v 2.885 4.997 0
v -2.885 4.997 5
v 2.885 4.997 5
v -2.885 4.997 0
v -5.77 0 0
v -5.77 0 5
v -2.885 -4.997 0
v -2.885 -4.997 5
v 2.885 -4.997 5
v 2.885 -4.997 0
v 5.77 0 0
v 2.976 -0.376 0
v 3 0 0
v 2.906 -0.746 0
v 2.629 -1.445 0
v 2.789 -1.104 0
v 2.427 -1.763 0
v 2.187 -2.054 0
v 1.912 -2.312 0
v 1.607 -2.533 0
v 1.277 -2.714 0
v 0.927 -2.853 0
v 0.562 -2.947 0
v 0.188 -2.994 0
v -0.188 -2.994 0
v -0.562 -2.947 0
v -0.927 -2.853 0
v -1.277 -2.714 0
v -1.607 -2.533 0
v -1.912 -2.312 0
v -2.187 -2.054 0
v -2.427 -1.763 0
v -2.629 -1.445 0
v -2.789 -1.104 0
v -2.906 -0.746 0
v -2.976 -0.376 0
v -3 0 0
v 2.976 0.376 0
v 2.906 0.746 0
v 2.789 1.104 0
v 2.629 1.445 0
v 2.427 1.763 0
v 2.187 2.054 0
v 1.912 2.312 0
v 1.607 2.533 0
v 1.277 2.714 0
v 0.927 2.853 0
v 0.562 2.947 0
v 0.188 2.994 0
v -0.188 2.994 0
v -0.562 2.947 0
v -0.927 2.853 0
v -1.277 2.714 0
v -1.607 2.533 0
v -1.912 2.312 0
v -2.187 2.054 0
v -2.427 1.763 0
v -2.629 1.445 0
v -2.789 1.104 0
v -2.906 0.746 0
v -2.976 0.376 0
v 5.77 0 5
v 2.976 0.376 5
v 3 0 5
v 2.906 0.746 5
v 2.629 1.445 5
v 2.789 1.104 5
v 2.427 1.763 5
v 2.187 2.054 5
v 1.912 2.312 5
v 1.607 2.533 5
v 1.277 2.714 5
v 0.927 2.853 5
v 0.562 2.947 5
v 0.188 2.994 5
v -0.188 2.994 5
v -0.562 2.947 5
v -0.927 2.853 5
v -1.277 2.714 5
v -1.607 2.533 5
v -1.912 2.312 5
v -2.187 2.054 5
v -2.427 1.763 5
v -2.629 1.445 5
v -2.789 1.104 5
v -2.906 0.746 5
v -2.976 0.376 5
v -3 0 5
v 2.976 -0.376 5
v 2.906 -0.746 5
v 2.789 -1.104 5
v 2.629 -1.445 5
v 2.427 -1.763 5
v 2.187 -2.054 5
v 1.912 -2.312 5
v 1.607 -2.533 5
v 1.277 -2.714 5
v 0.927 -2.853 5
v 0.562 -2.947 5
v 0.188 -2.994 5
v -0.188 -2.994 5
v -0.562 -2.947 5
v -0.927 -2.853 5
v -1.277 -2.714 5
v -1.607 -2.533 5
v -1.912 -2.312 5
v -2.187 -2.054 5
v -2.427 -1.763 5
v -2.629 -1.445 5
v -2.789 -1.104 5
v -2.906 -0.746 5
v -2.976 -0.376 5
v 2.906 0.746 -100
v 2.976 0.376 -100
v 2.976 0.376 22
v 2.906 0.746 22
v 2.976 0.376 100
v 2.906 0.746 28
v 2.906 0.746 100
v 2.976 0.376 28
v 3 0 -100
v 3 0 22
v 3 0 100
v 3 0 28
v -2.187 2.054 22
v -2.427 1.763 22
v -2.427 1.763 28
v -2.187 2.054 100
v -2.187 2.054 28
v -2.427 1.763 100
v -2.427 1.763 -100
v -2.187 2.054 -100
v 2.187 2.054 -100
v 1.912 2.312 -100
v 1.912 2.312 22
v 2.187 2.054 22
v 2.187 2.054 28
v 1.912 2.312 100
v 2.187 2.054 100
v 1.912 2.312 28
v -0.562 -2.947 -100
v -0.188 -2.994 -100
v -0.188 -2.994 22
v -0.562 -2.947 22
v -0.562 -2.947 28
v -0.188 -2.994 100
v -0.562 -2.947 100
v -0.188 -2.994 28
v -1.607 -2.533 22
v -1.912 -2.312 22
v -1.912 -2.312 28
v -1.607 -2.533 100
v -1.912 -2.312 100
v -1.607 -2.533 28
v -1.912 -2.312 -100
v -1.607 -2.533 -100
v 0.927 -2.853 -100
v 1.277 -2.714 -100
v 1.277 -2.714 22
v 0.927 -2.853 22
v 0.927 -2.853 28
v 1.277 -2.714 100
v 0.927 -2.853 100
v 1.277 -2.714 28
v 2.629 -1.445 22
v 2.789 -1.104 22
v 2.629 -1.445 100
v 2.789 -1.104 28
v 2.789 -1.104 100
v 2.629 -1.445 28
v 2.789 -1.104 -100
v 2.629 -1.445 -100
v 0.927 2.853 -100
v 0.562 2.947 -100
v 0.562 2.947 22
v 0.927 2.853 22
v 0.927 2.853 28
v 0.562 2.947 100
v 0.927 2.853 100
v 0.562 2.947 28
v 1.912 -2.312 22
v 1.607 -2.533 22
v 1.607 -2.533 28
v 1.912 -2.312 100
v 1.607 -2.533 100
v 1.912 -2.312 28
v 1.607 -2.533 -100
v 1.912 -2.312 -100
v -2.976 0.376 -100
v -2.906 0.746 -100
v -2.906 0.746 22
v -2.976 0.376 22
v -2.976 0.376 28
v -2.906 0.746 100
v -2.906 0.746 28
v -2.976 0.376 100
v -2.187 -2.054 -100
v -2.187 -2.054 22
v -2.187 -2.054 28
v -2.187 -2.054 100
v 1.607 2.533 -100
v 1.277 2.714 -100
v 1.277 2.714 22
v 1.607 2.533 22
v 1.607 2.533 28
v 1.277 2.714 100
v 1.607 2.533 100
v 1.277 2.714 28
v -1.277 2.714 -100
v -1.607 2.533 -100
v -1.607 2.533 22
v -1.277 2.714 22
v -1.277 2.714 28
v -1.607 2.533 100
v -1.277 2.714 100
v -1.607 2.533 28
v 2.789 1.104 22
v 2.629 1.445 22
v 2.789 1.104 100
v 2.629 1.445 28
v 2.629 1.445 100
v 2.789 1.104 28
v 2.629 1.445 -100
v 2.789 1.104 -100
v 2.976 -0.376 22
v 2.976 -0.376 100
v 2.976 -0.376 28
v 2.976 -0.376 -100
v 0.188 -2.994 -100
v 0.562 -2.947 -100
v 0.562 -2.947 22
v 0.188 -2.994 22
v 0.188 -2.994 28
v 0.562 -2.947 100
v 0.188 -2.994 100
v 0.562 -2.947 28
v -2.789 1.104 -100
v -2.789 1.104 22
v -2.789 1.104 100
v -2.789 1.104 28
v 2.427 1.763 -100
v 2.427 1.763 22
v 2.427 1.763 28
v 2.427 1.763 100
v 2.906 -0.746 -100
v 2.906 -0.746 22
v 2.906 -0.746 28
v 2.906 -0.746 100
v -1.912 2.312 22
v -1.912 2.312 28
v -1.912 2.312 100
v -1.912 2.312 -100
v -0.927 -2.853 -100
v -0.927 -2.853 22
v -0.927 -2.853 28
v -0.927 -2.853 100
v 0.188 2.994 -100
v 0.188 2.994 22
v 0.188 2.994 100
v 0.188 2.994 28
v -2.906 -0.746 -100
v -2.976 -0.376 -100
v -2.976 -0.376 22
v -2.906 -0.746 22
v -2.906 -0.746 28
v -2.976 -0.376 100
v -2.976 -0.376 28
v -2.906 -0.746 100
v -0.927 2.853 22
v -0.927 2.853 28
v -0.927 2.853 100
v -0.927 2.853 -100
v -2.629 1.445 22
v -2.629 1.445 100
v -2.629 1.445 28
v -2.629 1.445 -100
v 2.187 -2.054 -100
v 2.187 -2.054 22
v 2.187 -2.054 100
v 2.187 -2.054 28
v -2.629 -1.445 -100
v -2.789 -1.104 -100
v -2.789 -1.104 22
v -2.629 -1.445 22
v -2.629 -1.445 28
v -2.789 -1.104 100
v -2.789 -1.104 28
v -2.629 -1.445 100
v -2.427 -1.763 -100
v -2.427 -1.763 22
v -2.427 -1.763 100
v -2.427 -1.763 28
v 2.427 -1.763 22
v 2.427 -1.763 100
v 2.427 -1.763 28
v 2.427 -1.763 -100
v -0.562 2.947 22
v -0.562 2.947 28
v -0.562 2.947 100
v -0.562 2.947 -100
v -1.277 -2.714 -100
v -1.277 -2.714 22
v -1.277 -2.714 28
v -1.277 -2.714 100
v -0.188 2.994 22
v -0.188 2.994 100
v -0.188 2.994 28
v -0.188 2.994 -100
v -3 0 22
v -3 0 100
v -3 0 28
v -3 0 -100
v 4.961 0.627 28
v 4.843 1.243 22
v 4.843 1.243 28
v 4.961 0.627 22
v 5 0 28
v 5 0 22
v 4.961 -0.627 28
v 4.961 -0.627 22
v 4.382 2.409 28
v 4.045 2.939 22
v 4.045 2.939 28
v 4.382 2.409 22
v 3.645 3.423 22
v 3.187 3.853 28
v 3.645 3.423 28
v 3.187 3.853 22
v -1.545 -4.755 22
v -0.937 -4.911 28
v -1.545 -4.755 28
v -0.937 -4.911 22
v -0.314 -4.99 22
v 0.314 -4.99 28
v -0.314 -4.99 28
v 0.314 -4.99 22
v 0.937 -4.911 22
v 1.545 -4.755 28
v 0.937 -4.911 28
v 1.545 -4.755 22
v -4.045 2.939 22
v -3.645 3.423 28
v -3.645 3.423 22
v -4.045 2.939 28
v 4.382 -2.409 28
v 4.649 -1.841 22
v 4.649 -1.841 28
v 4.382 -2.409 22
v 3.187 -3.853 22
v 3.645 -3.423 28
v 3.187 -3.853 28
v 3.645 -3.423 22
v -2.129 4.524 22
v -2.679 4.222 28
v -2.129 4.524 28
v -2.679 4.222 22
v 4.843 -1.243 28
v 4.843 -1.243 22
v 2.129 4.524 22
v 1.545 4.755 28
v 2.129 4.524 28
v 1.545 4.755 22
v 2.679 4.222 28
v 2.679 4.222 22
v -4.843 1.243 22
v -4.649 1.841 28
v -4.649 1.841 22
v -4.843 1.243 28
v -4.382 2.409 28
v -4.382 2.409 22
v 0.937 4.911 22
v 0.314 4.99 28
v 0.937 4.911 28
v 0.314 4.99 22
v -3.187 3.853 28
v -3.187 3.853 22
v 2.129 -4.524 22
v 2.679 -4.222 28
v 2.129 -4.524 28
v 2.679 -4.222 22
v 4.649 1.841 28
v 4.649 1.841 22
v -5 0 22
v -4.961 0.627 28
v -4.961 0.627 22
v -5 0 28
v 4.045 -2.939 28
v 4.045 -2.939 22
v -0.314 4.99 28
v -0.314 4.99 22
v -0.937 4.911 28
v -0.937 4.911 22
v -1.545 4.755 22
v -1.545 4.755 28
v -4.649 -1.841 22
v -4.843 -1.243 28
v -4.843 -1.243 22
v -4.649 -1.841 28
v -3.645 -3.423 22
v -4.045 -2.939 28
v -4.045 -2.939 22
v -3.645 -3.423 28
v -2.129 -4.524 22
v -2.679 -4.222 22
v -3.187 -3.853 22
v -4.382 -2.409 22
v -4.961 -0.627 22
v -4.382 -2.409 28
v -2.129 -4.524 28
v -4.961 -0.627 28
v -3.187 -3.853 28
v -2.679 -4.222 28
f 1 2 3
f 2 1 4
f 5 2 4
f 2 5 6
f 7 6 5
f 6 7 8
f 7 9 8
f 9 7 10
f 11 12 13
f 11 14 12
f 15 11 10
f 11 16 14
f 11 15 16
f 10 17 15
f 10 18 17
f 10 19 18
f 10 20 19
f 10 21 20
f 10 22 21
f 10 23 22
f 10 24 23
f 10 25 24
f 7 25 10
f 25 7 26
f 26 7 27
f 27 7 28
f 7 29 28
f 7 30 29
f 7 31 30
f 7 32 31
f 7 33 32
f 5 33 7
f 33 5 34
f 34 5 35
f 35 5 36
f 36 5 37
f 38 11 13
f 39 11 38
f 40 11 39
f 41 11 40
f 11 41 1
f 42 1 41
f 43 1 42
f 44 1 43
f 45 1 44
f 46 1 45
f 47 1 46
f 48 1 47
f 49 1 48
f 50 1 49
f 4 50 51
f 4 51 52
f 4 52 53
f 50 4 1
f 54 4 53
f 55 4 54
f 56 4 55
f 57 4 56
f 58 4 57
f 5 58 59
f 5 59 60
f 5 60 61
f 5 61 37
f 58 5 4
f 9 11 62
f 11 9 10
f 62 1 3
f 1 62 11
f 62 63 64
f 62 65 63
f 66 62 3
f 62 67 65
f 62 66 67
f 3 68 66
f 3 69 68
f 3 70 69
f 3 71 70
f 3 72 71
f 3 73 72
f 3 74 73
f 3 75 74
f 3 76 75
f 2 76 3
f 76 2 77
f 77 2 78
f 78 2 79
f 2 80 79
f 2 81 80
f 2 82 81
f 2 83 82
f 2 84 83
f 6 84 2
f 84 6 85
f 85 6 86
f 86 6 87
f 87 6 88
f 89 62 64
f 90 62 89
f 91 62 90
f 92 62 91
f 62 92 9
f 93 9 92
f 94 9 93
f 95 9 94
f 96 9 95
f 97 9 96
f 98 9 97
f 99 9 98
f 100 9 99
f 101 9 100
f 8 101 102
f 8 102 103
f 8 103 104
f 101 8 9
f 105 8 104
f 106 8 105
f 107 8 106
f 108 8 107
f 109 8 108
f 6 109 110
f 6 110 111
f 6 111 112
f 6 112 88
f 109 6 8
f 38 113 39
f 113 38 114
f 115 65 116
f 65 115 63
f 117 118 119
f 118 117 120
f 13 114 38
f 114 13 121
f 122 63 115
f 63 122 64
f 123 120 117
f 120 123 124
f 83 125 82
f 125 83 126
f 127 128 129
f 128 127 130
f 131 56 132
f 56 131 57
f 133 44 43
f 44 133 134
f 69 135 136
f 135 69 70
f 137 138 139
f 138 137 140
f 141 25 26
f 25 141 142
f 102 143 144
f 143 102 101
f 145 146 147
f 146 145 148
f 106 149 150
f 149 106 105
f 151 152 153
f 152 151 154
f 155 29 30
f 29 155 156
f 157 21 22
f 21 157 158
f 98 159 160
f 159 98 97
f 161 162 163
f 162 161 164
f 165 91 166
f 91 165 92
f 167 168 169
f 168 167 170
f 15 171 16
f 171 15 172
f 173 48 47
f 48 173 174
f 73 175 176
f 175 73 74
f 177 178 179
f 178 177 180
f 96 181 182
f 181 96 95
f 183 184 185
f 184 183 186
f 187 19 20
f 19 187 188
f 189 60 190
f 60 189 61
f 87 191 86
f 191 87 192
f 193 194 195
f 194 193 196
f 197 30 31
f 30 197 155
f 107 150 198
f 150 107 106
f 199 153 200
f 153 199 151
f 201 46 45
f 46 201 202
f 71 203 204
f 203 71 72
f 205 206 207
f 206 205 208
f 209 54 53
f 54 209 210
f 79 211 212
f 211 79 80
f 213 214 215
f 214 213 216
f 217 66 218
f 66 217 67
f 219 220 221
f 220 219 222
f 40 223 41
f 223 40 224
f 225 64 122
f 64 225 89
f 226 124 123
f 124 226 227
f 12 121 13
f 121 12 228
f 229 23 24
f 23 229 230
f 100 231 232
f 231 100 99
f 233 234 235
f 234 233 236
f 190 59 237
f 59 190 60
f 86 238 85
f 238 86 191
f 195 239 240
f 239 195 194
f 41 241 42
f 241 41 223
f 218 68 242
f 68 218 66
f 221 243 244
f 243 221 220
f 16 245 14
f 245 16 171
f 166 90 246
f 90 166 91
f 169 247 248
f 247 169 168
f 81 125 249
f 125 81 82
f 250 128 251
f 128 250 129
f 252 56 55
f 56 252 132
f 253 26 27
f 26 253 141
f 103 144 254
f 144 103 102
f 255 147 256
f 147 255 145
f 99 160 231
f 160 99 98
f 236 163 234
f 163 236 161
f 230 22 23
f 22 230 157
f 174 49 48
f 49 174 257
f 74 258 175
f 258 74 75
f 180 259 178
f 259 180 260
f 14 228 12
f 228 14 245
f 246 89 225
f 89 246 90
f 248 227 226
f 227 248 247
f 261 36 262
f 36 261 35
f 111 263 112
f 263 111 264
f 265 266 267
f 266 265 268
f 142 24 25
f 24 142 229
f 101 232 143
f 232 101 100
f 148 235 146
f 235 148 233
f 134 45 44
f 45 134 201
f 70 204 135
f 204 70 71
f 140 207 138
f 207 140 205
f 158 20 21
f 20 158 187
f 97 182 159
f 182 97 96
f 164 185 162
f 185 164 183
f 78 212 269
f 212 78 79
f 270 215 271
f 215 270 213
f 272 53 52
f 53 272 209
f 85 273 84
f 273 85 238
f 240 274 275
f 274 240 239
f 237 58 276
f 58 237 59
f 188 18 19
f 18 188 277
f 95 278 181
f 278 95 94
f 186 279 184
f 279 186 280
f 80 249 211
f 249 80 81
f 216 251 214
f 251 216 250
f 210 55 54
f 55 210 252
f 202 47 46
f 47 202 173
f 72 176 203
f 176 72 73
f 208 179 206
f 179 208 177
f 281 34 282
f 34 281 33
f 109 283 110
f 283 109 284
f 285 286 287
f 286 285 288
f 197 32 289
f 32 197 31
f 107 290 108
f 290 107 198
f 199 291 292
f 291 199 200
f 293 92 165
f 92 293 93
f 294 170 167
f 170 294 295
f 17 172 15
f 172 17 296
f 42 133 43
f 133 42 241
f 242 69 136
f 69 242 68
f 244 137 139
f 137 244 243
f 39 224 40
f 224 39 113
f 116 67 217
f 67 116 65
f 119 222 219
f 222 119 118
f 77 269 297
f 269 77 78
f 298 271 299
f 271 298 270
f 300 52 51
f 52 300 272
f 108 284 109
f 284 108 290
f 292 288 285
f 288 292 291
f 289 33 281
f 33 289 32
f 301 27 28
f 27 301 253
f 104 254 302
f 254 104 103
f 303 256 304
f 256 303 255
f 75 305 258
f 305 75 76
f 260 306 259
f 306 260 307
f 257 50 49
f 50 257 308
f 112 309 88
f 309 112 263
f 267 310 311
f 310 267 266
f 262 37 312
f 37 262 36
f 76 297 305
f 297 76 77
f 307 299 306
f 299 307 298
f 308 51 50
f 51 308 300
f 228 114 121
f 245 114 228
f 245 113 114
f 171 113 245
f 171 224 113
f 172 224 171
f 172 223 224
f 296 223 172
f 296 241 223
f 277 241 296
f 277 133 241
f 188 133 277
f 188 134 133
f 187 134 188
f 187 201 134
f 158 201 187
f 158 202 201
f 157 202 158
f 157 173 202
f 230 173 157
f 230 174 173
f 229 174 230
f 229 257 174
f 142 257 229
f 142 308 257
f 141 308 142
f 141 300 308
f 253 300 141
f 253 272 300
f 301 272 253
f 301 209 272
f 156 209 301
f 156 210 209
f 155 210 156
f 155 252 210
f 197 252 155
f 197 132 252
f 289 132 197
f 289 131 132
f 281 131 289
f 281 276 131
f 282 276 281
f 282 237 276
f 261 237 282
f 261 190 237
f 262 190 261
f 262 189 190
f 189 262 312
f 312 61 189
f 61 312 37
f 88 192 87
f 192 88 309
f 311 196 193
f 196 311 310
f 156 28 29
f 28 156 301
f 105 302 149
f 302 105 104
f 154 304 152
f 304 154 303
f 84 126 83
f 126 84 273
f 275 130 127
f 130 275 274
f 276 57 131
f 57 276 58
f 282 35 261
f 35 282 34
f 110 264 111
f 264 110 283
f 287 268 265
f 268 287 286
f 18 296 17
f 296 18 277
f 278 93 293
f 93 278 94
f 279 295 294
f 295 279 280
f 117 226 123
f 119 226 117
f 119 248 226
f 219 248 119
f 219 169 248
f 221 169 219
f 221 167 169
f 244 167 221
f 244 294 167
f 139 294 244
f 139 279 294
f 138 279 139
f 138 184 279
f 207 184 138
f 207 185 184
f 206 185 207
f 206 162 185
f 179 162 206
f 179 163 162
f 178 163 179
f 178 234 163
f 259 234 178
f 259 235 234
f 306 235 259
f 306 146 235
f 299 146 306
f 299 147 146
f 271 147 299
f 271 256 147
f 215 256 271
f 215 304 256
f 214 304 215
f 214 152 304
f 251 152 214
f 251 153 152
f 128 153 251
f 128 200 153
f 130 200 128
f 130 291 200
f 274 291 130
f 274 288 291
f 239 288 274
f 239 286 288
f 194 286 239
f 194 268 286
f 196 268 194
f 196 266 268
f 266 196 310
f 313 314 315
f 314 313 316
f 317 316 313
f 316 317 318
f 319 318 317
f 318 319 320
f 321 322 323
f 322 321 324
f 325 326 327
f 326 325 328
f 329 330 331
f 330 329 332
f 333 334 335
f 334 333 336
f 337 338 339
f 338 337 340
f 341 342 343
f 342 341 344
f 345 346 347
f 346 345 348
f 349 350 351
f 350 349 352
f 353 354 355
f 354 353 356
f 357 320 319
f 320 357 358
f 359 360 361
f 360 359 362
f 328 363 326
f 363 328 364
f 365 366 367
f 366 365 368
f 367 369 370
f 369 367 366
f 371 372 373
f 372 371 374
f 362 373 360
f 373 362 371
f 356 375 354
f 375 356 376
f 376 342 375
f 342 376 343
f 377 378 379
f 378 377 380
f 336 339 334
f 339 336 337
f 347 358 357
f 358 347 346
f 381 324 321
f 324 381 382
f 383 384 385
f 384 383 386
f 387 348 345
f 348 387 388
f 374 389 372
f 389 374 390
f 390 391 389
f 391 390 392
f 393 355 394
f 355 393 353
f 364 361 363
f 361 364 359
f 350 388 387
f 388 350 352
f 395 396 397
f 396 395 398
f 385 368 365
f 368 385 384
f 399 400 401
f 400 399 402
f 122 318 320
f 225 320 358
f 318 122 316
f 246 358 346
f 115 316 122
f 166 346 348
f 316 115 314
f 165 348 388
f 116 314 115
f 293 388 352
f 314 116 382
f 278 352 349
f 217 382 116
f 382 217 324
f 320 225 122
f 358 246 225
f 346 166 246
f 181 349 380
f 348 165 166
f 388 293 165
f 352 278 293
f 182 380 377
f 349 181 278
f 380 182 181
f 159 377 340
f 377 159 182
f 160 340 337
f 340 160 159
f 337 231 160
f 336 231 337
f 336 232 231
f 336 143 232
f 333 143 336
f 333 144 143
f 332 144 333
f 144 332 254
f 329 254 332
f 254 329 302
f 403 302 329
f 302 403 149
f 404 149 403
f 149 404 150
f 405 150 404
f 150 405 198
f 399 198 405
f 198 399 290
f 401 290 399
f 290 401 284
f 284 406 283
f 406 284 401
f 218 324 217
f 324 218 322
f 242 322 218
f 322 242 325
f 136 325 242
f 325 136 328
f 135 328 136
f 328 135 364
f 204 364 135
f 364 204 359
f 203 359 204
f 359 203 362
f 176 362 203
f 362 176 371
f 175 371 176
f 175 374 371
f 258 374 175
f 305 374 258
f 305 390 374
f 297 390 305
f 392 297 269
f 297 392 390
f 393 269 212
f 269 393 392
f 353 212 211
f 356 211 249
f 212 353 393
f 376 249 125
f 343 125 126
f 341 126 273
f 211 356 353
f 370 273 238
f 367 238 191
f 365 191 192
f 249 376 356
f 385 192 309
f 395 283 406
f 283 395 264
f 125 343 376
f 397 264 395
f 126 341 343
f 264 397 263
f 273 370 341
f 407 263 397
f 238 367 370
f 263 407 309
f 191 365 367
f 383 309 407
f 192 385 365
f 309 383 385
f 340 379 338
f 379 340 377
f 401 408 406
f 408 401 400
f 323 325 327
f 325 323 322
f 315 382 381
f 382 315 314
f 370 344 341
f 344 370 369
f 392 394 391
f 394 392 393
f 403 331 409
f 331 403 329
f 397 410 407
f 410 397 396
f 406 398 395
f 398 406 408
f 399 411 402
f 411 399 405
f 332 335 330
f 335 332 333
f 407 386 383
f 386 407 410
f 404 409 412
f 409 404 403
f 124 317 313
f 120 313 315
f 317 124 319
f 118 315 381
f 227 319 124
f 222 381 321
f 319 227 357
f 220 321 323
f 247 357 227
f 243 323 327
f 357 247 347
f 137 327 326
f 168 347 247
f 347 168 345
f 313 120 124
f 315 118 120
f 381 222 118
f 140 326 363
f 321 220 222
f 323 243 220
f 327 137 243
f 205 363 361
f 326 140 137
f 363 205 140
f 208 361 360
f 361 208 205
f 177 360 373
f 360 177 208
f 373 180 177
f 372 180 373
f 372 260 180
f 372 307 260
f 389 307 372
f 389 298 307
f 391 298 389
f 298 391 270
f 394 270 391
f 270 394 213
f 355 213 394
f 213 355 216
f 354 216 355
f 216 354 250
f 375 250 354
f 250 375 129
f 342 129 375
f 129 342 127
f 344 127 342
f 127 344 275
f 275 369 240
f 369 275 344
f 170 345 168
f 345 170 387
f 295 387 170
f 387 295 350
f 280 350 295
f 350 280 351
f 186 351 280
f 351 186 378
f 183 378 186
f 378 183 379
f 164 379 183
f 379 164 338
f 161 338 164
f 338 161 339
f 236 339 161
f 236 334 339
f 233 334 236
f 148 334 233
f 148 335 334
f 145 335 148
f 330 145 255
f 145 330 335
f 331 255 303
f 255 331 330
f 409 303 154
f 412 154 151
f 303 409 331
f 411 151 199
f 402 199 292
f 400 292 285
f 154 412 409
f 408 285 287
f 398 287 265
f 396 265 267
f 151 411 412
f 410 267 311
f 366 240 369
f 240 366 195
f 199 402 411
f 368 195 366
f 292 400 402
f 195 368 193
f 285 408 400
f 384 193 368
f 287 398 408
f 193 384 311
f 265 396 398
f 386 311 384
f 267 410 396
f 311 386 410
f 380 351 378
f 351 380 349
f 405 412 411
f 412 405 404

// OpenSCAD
$fn = 50;

difference() {
	union() {
		translate(v = [0, 0, 0]) {
			rotate(a = [0, 0, 0]) {
				difference() {
					union() {
						translate(v = [0, 0, 0.0]) {
							rotate(a = [0, 0, 0]) {
								difference() {
									union() {
										linear_extrude(height = 5) {
											polygon(points = [[5.77, 0.0], [2.8850000000000002, 4.996966579836211], [-2.8849999999999985, 4.996966579836211], [-5.77, 7.066212031080227e-16], [-2.8850000000000025, -4.99696657983621], [2.884999999999996, -4.996966579836213]]);
										}
										translate(v = [0, 0, -100.0]) {
											cylinder(h = 200, r = 3.0);
										}
									}
									union();
								}
							}
						}
						translate(v = [0, 0, 22.0]) {
							cylinder(h = 6, r = 5.0);
						}
						cylinder(h = 22, r = 3.0);
					}
					union();
				}
			}
		}
	}
	union();
}
